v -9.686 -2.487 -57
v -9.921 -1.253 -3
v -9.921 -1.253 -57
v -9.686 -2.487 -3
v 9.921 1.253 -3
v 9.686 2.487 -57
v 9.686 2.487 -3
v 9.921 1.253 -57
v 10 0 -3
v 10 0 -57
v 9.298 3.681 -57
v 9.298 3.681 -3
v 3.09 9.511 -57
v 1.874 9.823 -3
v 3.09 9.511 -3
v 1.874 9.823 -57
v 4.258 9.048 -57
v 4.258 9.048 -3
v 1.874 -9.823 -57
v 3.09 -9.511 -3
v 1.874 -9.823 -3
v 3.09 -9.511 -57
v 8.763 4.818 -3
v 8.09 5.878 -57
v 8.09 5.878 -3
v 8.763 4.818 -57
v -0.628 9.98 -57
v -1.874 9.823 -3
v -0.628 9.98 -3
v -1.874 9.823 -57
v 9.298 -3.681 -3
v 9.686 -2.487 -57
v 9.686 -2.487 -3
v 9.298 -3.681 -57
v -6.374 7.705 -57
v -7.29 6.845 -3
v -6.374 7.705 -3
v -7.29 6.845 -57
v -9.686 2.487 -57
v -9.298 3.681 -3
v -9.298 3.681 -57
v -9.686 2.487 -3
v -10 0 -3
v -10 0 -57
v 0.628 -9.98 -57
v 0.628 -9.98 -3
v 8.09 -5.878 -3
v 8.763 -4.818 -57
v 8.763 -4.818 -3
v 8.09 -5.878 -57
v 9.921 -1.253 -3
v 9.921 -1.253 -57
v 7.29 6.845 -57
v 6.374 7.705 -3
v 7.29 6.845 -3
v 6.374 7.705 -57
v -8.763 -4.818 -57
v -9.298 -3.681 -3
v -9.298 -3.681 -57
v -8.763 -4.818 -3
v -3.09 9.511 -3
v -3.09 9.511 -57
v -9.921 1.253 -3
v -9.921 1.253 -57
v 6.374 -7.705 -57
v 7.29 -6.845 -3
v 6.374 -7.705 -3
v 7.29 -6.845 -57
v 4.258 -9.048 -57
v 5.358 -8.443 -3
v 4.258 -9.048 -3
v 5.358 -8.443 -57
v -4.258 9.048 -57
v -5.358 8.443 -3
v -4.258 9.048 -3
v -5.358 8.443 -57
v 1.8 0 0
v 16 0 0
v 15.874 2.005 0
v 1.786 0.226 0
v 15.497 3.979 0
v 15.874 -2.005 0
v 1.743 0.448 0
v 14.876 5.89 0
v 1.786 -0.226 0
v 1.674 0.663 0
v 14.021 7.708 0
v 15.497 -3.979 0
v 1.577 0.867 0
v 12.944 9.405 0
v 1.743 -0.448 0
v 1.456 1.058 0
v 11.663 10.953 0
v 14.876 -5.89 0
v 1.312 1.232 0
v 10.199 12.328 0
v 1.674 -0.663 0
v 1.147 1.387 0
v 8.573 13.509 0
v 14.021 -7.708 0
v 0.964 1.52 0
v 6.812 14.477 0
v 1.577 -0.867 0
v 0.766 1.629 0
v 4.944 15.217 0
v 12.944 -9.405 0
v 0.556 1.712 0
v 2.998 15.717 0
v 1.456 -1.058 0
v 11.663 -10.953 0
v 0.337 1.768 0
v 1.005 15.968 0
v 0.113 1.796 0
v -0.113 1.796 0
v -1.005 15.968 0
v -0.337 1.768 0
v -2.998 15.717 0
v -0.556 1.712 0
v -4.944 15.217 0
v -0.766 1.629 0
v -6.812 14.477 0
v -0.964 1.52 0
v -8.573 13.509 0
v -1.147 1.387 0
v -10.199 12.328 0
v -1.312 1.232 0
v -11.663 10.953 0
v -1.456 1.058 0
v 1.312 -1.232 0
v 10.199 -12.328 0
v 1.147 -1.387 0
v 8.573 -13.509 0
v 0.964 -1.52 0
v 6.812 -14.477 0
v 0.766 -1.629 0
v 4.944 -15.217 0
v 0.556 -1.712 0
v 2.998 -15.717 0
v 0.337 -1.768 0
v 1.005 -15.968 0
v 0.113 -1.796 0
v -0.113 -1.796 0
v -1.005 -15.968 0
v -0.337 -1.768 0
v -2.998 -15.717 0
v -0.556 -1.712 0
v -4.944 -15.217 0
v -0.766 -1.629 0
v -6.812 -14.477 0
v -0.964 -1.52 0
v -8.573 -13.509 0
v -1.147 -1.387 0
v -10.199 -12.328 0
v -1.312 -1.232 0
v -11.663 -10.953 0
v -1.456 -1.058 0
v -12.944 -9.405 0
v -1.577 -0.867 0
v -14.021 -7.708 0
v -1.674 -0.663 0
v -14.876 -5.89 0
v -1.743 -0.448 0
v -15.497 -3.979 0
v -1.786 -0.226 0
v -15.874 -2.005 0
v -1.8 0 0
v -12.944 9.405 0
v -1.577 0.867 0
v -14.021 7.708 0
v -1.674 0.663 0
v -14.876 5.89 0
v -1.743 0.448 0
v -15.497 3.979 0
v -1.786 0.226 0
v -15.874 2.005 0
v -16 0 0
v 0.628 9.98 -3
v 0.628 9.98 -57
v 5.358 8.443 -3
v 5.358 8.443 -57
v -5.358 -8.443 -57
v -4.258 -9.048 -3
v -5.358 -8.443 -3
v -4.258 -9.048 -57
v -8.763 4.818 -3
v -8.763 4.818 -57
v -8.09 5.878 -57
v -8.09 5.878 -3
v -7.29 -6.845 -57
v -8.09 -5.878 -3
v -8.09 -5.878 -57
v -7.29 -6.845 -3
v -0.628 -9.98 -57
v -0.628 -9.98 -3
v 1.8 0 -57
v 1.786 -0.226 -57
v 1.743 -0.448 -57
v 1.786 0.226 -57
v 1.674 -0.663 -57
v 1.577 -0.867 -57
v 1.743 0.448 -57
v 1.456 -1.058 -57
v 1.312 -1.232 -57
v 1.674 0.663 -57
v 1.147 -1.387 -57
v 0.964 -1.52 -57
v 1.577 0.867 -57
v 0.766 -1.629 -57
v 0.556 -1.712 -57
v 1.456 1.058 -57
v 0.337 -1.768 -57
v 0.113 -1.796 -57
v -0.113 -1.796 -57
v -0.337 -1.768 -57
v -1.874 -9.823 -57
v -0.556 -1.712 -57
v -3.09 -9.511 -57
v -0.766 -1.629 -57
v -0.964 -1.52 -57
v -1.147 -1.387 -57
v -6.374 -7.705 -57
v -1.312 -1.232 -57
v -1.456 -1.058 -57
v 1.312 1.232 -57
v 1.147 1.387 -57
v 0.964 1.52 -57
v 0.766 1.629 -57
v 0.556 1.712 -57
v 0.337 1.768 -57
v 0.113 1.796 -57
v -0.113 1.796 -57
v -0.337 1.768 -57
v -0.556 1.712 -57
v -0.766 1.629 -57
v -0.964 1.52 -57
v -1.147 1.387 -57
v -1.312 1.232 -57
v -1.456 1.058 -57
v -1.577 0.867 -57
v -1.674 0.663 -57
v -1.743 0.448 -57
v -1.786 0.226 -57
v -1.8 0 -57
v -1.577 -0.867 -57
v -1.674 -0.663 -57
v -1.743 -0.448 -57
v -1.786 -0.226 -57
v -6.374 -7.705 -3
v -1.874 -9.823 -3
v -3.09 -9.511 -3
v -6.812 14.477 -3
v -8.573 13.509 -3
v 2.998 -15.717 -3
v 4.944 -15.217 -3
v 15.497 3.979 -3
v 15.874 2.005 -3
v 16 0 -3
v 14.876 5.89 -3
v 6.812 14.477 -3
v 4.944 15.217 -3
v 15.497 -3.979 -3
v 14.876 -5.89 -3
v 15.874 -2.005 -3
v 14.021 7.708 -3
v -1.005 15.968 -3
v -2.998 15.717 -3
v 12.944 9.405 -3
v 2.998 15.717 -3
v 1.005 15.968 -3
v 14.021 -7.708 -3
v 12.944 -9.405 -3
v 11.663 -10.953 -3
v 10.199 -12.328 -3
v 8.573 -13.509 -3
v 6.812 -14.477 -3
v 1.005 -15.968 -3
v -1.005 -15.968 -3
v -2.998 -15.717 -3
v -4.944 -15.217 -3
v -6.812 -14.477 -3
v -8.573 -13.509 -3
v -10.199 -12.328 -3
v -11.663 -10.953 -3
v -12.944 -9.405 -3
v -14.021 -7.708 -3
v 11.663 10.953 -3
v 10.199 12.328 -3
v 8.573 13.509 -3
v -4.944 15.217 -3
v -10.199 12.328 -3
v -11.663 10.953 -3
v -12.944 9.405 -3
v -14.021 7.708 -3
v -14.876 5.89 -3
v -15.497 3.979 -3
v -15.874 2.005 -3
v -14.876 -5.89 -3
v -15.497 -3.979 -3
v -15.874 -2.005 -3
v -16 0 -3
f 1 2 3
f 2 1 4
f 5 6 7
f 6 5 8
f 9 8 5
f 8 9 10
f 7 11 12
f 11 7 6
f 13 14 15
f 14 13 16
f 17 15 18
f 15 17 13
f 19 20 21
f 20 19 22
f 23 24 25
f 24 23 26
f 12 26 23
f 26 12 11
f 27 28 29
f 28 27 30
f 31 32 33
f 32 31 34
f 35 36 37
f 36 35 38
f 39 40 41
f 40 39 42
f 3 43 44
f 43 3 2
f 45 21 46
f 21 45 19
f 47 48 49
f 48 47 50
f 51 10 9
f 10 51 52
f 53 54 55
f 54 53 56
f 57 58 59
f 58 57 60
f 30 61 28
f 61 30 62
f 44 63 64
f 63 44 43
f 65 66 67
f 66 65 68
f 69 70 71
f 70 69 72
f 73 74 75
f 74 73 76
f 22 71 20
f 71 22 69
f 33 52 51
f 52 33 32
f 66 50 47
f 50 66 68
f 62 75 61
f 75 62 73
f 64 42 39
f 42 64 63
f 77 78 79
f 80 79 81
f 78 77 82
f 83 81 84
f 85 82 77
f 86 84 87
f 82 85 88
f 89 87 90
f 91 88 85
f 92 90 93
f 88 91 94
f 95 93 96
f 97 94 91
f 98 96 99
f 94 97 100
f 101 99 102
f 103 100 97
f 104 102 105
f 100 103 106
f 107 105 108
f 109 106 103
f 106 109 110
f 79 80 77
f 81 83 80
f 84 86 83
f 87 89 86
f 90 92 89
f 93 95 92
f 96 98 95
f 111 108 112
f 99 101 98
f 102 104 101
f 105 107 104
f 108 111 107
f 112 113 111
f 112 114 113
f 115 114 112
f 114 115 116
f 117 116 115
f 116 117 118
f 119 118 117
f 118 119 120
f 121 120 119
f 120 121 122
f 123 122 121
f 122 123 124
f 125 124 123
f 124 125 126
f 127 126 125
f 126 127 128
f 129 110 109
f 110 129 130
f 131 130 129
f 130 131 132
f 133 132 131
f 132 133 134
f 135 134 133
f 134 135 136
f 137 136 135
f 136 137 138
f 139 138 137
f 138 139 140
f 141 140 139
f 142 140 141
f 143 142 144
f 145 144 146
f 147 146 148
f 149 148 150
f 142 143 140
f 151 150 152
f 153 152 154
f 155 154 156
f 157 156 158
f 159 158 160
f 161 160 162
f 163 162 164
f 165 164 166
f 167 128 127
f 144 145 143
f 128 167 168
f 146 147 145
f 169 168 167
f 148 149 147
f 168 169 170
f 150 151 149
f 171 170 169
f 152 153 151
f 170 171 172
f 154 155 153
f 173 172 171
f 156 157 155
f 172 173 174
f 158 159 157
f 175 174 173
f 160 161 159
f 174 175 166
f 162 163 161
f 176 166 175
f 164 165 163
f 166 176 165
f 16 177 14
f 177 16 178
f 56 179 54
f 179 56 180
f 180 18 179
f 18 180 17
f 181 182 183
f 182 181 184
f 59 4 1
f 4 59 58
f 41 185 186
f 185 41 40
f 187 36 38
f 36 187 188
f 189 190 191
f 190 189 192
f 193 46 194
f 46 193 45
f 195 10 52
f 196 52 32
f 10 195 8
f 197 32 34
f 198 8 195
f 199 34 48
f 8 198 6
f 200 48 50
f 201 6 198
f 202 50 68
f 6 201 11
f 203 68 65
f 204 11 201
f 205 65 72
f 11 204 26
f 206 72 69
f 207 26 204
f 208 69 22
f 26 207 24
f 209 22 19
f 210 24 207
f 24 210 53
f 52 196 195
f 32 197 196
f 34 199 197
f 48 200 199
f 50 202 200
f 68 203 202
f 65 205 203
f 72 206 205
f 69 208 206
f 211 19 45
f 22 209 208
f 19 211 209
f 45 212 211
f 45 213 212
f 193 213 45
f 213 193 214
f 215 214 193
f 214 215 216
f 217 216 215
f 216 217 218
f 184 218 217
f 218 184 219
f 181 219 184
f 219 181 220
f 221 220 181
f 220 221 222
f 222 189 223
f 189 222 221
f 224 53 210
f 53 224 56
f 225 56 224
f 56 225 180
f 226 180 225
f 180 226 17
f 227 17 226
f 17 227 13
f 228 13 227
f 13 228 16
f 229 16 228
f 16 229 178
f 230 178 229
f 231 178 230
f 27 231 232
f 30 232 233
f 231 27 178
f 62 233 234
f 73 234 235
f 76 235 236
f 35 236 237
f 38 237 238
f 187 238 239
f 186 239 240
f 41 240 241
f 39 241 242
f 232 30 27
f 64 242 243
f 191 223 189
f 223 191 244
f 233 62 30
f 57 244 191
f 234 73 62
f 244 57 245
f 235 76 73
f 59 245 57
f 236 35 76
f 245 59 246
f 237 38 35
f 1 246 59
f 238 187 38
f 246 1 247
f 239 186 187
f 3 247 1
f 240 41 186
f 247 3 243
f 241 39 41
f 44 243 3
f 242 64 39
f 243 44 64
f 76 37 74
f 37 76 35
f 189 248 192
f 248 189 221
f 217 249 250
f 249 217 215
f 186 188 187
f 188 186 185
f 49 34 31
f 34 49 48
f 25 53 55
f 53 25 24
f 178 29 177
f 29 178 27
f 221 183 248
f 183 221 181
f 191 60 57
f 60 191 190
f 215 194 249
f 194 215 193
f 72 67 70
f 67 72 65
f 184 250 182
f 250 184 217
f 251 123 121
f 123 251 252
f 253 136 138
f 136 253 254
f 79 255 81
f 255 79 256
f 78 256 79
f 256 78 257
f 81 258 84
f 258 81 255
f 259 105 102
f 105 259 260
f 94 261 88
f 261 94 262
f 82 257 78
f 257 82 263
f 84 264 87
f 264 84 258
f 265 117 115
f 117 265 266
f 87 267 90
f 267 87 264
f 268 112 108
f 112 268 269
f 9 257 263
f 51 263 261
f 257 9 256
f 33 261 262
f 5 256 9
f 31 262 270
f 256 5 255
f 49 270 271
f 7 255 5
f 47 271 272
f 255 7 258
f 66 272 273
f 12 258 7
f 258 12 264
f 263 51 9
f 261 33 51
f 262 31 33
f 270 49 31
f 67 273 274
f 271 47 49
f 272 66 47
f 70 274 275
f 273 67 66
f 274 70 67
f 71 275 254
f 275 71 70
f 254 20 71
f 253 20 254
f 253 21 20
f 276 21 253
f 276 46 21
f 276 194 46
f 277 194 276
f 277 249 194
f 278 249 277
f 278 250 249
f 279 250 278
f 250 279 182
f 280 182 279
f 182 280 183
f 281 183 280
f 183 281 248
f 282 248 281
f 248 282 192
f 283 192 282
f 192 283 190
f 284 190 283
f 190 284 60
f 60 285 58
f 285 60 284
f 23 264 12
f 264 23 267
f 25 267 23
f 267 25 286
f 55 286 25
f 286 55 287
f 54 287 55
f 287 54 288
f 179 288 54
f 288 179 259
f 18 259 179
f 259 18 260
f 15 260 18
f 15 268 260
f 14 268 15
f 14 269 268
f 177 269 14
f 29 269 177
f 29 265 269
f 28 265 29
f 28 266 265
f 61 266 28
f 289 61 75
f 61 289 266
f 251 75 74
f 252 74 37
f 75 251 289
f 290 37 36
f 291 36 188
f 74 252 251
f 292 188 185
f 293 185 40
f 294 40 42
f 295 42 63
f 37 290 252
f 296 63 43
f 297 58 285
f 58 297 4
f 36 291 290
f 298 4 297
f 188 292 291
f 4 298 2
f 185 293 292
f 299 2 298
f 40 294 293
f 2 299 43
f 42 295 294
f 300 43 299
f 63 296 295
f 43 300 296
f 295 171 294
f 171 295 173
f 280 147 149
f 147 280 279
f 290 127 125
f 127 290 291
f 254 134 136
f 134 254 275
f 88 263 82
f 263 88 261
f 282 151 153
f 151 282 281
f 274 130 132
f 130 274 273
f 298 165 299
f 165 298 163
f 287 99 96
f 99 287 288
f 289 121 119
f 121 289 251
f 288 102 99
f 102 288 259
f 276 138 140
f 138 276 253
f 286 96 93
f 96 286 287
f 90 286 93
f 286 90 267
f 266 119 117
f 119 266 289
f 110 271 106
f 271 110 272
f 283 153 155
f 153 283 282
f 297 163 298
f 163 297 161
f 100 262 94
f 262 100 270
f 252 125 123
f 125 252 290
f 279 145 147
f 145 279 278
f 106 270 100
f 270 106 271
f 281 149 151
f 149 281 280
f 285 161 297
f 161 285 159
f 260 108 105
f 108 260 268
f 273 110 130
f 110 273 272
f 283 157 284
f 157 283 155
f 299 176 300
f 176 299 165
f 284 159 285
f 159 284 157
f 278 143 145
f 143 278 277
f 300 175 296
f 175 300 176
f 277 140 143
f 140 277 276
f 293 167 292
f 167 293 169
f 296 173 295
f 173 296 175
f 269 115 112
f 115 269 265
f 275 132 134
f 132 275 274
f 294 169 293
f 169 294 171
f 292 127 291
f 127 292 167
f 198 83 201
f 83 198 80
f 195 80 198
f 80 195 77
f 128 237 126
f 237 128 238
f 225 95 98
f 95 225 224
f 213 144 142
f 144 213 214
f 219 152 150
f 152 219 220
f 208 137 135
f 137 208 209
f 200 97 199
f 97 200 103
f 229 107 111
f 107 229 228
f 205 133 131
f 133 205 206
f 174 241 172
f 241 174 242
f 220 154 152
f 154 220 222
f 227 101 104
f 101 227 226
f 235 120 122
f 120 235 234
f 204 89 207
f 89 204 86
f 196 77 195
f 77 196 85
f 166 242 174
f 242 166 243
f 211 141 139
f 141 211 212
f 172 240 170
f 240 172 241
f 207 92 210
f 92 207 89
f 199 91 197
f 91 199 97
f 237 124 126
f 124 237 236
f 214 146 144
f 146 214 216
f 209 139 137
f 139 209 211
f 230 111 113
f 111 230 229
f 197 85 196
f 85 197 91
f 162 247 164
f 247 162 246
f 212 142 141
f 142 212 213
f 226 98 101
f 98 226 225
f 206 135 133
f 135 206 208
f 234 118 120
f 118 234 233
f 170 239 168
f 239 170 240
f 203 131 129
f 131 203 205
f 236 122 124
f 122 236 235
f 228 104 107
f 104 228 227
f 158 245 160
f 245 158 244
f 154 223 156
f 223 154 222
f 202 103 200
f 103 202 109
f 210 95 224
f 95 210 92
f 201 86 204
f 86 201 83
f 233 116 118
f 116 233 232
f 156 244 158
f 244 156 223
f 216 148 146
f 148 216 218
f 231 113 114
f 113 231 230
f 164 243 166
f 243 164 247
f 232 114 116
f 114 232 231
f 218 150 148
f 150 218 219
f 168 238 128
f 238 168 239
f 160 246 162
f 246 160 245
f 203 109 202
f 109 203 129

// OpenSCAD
$fn = 50;


difference() {
	union() {
		translate(v = [0, 0, -57.0000000000]) {
			cylinder(h = 57, r = 10.0000000000);
		}
		translate(v = [0, 0, -3.0000000000]) {
			cylinder(h = 3, r = 16.0000000000);
		}
	}
	union() {
		#translate(v = [0, 0, -57]) {
			cylinder(h = 57, r = 1.8000000000);
		}
	}
}
